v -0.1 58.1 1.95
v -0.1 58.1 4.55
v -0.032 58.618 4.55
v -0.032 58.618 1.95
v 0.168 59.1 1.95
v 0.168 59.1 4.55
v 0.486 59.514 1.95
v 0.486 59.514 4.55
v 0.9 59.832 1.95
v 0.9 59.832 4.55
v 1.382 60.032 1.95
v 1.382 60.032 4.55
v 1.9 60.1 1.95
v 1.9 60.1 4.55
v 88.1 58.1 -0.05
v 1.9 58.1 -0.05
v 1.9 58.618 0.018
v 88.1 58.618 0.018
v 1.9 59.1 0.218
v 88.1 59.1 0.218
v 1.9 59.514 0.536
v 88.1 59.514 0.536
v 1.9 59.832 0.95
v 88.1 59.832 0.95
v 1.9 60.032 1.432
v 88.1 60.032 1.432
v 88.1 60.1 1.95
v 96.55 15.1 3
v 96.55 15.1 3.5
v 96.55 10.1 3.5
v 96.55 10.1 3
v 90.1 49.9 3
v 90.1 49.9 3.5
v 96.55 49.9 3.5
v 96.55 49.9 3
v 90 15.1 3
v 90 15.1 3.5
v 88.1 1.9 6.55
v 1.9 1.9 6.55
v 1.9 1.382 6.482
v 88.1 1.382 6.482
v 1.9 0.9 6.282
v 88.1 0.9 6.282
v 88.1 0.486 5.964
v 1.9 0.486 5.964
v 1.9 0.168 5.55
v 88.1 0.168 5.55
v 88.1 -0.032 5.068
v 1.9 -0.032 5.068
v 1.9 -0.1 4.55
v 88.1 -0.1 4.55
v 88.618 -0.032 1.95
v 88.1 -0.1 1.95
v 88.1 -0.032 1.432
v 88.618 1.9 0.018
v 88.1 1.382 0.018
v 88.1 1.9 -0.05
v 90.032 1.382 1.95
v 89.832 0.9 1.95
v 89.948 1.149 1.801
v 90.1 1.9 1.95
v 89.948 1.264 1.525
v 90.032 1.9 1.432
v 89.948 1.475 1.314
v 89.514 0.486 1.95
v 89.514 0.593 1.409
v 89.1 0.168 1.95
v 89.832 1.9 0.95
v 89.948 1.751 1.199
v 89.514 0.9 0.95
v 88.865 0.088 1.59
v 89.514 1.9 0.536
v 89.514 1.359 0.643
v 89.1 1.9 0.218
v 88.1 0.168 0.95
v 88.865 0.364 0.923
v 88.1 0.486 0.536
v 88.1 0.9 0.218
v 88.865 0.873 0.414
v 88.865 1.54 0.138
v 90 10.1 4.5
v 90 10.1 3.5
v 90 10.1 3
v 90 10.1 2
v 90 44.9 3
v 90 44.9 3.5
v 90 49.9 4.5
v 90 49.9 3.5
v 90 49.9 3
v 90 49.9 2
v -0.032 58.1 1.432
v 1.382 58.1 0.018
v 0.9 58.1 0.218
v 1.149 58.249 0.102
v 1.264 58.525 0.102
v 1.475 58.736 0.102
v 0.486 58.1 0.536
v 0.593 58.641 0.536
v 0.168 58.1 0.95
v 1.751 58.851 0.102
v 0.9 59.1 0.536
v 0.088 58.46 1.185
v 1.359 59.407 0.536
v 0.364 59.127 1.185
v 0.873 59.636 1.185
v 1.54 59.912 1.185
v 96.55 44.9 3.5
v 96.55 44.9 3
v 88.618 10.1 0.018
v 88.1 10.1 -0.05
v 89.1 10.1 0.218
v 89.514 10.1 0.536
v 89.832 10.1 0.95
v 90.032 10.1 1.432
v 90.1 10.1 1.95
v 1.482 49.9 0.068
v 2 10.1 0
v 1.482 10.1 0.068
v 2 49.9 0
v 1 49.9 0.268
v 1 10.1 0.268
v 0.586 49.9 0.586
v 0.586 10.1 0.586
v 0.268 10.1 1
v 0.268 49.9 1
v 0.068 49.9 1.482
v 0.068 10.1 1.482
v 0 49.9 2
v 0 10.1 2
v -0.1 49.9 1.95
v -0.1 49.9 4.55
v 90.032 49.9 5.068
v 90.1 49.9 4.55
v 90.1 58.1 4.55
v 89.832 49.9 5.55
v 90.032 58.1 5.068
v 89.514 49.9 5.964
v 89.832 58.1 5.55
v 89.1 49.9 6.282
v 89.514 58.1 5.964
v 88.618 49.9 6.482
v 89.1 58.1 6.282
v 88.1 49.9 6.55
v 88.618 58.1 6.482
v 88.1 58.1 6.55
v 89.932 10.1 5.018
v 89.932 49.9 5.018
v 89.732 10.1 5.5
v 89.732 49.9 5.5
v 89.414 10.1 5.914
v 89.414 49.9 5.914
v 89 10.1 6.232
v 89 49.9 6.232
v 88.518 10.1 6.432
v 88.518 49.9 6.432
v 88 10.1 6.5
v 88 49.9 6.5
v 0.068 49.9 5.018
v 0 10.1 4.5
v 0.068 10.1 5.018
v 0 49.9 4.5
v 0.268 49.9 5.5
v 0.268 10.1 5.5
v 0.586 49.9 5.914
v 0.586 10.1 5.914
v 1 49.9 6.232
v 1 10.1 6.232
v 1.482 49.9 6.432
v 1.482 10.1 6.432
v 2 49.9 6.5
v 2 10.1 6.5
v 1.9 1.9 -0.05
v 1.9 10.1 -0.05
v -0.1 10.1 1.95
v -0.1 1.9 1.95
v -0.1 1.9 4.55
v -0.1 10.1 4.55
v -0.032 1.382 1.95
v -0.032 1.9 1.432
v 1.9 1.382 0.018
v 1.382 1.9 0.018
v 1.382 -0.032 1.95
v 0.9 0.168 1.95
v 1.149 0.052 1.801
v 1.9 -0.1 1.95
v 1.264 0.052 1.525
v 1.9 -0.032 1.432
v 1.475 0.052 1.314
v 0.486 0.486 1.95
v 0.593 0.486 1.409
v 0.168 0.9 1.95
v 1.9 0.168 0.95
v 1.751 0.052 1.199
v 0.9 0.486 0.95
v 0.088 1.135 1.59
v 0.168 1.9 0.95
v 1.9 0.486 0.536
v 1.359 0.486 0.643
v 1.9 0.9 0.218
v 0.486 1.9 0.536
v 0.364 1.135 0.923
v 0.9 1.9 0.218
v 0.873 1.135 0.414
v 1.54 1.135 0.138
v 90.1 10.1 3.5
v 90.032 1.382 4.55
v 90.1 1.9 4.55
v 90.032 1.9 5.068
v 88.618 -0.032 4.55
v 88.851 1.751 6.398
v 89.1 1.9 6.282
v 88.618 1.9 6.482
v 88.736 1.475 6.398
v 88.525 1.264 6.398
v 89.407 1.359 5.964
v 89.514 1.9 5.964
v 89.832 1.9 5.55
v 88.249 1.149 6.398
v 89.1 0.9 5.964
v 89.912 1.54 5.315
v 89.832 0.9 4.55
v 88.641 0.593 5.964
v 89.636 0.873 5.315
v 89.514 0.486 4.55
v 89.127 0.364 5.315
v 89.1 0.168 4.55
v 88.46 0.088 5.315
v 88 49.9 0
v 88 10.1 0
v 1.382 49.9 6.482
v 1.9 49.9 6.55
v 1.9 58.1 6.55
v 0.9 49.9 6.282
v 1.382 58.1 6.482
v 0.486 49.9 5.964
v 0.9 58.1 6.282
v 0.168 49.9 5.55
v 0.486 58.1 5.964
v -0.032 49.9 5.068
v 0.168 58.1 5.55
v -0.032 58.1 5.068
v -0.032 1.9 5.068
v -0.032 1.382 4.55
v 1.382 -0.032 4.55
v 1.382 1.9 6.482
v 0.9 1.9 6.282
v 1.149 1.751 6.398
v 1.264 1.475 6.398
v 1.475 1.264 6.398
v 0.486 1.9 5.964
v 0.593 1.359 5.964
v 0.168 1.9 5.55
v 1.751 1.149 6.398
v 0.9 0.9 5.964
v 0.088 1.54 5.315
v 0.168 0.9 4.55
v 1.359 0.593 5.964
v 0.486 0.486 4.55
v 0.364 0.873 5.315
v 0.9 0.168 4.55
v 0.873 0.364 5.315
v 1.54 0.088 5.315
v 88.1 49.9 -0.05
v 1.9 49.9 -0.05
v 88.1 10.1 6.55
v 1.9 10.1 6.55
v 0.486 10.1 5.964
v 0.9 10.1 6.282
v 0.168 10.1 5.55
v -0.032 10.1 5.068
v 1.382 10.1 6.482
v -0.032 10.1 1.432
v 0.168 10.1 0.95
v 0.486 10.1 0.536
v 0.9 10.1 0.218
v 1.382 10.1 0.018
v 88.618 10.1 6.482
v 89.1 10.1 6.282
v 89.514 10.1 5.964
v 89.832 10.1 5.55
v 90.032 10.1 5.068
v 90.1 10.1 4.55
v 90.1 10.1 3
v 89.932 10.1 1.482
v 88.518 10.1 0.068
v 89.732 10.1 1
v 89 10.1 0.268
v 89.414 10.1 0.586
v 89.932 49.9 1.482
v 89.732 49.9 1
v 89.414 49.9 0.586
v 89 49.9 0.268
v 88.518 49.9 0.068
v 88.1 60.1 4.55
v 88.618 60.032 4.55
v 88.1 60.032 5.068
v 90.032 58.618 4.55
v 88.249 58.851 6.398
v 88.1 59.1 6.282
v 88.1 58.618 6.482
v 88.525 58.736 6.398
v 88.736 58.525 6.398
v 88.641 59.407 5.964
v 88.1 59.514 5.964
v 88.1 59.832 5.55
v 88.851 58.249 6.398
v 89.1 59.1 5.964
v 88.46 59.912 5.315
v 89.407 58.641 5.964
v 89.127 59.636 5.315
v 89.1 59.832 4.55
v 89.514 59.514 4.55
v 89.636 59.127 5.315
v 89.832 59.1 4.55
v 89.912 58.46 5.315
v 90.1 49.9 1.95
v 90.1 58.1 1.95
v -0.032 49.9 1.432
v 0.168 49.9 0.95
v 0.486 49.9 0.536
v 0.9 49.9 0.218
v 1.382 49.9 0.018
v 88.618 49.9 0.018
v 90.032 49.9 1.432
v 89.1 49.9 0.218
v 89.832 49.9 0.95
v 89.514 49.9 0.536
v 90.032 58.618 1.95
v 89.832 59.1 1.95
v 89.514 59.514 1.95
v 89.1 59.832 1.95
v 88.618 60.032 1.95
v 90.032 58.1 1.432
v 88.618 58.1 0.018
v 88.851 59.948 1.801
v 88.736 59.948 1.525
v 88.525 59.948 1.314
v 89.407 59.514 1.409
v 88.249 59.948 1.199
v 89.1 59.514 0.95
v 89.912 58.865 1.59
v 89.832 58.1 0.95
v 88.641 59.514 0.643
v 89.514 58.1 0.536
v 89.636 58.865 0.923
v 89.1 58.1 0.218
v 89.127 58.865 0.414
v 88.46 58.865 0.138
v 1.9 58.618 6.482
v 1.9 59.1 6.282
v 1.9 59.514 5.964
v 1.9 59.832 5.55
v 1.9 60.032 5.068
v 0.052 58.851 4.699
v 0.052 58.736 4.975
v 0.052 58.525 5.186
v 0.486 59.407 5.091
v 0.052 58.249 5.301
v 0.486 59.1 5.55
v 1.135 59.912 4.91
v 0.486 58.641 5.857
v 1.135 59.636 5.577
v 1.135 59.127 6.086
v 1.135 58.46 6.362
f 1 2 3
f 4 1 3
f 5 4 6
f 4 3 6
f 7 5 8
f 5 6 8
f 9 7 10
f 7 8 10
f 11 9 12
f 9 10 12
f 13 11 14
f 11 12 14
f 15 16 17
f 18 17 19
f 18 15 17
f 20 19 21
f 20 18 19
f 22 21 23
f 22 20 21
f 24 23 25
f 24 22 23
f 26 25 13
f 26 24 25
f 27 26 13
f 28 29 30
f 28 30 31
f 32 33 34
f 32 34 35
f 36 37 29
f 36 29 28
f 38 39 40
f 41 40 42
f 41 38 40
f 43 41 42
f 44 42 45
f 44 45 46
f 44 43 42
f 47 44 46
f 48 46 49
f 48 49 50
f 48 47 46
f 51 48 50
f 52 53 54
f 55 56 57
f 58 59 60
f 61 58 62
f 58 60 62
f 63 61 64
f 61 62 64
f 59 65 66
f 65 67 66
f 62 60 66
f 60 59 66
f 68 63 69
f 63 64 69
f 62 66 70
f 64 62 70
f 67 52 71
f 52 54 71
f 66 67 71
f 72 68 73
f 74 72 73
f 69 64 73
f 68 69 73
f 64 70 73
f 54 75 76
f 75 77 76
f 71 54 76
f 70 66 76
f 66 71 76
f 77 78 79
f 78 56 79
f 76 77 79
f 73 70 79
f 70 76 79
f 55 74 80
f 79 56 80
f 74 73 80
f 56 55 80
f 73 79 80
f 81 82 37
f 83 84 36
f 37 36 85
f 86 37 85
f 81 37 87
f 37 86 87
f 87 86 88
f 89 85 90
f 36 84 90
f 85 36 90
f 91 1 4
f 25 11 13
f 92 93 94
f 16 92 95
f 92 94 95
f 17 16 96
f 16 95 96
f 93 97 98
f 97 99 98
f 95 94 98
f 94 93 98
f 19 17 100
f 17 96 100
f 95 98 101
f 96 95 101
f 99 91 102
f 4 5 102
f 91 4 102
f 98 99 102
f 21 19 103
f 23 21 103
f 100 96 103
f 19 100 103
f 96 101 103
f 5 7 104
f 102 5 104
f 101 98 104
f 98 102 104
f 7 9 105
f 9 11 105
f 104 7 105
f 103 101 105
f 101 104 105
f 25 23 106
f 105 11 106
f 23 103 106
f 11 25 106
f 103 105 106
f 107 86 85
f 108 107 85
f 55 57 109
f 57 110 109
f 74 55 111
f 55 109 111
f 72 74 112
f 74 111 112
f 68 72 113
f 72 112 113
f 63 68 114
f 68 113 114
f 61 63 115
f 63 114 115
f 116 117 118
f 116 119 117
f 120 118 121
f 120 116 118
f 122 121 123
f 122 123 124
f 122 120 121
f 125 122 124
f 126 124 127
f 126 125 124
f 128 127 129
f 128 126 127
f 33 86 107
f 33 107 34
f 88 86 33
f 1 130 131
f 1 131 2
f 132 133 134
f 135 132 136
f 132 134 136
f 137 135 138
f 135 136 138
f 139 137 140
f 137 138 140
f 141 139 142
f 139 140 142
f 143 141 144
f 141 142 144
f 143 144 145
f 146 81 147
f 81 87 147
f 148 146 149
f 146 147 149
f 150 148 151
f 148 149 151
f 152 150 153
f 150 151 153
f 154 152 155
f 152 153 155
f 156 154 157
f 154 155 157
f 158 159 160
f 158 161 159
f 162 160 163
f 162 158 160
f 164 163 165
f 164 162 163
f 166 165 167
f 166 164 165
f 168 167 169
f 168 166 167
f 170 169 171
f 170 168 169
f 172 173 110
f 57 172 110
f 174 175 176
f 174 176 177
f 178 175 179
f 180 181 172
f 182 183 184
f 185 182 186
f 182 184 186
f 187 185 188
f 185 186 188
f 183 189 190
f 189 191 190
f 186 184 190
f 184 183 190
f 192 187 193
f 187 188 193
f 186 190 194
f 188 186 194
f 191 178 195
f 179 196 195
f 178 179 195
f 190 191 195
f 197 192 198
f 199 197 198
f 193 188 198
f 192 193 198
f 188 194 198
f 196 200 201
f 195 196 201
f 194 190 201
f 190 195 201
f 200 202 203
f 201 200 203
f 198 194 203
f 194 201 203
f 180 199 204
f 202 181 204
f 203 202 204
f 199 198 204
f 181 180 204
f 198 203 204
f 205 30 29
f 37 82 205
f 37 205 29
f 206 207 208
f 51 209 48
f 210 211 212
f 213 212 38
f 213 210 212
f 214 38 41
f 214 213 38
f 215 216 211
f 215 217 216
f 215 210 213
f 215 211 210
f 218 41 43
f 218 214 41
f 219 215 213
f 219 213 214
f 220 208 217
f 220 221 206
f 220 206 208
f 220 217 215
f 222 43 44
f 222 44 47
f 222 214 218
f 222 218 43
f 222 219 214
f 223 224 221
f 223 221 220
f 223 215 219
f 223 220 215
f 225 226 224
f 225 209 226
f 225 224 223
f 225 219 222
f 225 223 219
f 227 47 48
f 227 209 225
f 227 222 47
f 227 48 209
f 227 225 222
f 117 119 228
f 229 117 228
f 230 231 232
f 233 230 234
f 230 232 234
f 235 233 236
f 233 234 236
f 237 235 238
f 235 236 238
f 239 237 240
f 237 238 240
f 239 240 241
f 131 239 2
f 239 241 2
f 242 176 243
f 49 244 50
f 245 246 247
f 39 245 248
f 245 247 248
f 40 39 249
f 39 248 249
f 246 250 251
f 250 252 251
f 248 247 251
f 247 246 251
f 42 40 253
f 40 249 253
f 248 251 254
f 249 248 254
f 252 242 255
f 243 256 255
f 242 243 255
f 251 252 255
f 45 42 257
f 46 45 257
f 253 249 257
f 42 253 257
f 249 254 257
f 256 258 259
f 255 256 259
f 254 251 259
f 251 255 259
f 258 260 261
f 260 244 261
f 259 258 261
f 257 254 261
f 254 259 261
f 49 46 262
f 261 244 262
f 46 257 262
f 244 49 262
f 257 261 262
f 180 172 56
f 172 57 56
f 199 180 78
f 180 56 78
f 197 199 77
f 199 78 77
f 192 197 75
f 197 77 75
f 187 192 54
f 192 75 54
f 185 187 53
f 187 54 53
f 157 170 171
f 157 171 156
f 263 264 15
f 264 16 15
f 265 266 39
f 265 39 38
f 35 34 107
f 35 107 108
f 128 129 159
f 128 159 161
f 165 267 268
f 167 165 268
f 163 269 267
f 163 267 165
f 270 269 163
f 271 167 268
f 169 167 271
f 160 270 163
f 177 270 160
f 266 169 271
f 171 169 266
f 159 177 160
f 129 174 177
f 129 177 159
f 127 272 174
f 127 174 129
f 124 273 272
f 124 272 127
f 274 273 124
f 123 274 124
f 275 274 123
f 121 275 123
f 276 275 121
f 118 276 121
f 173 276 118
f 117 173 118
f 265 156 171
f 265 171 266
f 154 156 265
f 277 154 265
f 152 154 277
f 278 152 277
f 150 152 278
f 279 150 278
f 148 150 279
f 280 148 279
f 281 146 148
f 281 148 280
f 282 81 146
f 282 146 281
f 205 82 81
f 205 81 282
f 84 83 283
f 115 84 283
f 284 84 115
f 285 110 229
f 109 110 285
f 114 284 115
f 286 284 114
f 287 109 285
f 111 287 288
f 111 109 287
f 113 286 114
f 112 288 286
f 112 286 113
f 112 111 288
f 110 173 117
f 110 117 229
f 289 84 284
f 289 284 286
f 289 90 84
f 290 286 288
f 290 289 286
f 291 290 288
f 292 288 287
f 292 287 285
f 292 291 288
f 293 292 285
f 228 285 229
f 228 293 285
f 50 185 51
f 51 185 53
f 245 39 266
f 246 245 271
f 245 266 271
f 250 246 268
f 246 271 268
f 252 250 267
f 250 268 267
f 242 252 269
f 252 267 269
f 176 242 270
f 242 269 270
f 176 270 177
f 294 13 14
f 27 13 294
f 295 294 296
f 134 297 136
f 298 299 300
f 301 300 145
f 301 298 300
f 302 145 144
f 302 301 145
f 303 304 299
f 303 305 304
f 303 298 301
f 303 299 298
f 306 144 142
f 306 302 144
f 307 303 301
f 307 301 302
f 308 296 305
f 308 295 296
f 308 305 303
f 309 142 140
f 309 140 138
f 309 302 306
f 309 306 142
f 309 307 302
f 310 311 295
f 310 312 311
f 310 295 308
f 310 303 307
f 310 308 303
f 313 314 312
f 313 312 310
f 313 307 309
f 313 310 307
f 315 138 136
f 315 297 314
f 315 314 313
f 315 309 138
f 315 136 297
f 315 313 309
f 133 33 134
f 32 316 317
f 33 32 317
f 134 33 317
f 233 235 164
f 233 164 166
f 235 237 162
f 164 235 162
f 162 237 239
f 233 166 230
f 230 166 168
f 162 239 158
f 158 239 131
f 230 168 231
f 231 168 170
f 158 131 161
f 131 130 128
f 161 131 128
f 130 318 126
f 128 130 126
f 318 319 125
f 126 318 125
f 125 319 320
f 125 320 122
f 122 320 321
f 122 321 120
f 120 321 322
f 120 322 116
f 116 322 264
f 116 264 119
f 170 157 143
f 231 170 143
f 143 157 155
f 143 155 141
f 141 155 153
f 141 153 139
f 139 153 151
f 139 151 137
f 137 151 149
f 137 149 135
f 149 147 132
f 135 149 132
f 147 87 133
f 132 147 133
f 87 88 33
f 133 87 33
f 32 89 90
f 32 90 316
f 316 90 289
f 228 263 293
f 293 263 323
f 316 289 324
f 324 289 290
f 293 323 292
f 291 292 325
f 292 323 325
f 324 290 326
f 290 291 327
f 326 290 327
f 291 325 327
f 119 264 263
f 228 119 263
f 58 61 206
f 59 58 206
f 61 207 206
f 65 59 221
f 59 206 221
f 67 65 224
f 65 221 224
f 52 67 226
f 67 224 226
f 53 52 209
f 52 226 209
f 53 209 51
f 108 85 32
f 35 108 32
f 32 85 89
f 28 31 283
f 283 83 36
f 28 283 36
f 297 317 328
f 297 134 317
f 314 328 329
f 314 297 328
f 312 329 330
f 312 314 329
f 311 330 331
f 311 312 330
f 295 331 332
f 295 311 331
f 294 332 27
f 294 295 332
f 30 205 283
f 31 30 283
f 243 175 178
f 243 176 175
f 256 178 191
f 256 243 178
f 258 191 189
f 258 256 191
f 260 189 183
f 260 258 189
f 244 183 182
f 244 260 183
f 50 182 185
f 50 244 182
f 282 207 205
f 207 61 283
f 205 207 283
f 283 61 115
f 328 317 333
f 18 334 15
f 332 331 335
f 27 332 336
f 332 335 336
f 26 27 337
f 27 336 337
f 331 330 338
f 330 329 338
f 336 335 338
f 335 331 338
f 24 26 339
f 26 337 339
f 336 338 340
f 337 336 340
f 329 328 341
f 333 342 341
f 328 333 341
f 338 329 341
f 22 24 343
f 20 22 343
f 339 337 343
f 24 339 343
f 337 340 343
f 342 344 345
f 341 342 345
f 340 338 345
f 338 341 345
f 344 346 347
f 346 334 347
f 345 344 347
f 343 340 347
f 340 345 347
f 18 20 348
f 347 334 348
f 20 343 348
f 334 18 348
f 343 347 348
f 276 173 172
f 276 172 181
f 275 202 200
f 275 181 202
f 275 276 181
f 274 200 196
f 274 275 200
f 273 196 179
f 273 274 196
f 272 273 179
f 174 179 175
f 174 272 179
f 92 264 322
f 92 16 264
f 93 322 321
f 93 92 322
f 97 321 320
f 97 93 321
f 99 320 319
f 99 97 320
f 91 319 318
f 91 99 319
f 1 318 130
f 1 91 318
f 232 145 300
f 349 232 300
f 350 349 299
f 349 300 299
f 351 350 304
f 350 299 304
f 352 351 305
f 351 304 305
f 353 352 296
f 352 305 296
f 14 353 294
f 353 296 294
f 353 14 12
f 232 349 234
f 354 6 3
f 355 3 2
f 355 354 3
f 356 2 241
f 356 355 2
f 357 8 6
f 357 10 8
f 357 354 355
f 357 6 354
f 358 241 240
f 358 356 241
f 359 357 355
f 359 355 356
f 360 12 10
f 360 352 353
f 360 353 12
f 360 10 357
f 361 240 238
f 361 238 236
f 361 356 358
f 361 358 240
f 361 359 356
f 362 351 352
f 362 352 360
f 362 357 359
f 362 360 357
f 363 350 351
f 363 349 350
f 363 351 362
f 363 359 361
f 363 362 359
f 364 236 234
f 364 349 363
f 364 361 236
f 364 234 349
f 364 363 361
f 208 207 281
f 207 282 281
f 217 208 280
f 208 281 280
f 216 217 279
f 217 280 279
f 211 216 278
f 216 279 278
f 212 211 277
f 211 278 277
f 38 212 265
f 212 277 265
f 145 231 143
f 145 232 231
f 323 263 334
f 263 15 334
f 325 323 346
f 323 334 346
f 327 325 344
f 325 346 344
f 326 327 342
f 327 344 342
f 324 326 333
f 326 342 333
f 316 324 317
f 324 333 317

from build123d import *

# Parameters (mm, degrees)
SKETCH_1_W           = 90
SKETCH_1_H           = 60
EXTRUDE_1_DEPTH      = 6.5
EXTRUDE_2_DEPTH      = 0.05
EXTRUDE_2_DEPTH_BACK = 6.55
SKETCH_2_W           = 90.2
SKETCH_2_H           = 10.2
SKETCH_3_W           = 0.5
SKETCH_3_H           = 5
EXTRUDE_3_DEPTH      = 6.55
FILLET_1_R           = 2


with BuildPart() as part:
    # Sketch 1 → Extrude 1 (new body)
    with BuildSketch(Plane.XY):
        with Locations((45, 30)):
            Rectangle(SKETCH_1_W, SKETCH_1_H)
    extrude(amount=EXTRUDE_1_DEPTH)

    # Sketch 2 → Extrude 2 (add, two sides: drawn at the far end of the back side and taken through both)
    with BuildSketch(Plane.XY.offset(6.5).offset(-EXTRUDE_2_DEPTH_BACK)):
        with Locations((45, 55)):
            Rectangle(SKETCH_2_W, SKETCH_2_H)
        with Locations((45, 5)):
            Rectangle(SKETCH_2_W, SKETCH_2_H)
    extrude(amount=EXTRUDE_2_DEPTH + EXTRUDE_2_DEPTH_BACK)

    # Sketch 3 → Extrude 3 (add)
    with BuildSketch(Plane(origin=(90, 0, 0), x_dir=(0, 0, -1), z_dir=(1, 0, 0))):
        with Locations((-3.25, 47.4)):
            Rectangle(SKETCH_3_W, SKETCH_3_H)
        with Locations((-3.25, 12.6)):
            Rectangle(SKETCH_3_W, SKETCH_3_H)
    extrude(amount=EXTRUDE_3_DEPTH)

    # Fillet 1
    fillet_1_edges = [part.edges().sort_by_distance(p)[0] for p in [
        (0, 30, 0),
        (90, 30, 0),
        (0, 30, 6.5),
        (90, 30, 6.5),
        (90.1, 55, -0.05),
        (90.1, 60.1, 3.25),
        (45, 60.1, 6.55),
        (-0.1, 60.1, 3.25),
        (-0.1, 55, 6.55),
        (90.1, 55, 6.55),
        (-0.1, 55, -0.05),
        (45, 60.1, -0.05),
        (-0.1, 5, -0.05),
        (-0.1, -0.1, 3.25),
        (45, -0.1, -0.05),
        (90.1, -0.1, 3.25),
        (90.1, 5, 6.55),
        (-0.1, 5, 6.55),
        (45, -0.1, 6.55),
        (90.1, 5, -0.05),
    ]]
    fillet(fillet_1_edges, radius=FILLET_1_R)


solid = part.part
